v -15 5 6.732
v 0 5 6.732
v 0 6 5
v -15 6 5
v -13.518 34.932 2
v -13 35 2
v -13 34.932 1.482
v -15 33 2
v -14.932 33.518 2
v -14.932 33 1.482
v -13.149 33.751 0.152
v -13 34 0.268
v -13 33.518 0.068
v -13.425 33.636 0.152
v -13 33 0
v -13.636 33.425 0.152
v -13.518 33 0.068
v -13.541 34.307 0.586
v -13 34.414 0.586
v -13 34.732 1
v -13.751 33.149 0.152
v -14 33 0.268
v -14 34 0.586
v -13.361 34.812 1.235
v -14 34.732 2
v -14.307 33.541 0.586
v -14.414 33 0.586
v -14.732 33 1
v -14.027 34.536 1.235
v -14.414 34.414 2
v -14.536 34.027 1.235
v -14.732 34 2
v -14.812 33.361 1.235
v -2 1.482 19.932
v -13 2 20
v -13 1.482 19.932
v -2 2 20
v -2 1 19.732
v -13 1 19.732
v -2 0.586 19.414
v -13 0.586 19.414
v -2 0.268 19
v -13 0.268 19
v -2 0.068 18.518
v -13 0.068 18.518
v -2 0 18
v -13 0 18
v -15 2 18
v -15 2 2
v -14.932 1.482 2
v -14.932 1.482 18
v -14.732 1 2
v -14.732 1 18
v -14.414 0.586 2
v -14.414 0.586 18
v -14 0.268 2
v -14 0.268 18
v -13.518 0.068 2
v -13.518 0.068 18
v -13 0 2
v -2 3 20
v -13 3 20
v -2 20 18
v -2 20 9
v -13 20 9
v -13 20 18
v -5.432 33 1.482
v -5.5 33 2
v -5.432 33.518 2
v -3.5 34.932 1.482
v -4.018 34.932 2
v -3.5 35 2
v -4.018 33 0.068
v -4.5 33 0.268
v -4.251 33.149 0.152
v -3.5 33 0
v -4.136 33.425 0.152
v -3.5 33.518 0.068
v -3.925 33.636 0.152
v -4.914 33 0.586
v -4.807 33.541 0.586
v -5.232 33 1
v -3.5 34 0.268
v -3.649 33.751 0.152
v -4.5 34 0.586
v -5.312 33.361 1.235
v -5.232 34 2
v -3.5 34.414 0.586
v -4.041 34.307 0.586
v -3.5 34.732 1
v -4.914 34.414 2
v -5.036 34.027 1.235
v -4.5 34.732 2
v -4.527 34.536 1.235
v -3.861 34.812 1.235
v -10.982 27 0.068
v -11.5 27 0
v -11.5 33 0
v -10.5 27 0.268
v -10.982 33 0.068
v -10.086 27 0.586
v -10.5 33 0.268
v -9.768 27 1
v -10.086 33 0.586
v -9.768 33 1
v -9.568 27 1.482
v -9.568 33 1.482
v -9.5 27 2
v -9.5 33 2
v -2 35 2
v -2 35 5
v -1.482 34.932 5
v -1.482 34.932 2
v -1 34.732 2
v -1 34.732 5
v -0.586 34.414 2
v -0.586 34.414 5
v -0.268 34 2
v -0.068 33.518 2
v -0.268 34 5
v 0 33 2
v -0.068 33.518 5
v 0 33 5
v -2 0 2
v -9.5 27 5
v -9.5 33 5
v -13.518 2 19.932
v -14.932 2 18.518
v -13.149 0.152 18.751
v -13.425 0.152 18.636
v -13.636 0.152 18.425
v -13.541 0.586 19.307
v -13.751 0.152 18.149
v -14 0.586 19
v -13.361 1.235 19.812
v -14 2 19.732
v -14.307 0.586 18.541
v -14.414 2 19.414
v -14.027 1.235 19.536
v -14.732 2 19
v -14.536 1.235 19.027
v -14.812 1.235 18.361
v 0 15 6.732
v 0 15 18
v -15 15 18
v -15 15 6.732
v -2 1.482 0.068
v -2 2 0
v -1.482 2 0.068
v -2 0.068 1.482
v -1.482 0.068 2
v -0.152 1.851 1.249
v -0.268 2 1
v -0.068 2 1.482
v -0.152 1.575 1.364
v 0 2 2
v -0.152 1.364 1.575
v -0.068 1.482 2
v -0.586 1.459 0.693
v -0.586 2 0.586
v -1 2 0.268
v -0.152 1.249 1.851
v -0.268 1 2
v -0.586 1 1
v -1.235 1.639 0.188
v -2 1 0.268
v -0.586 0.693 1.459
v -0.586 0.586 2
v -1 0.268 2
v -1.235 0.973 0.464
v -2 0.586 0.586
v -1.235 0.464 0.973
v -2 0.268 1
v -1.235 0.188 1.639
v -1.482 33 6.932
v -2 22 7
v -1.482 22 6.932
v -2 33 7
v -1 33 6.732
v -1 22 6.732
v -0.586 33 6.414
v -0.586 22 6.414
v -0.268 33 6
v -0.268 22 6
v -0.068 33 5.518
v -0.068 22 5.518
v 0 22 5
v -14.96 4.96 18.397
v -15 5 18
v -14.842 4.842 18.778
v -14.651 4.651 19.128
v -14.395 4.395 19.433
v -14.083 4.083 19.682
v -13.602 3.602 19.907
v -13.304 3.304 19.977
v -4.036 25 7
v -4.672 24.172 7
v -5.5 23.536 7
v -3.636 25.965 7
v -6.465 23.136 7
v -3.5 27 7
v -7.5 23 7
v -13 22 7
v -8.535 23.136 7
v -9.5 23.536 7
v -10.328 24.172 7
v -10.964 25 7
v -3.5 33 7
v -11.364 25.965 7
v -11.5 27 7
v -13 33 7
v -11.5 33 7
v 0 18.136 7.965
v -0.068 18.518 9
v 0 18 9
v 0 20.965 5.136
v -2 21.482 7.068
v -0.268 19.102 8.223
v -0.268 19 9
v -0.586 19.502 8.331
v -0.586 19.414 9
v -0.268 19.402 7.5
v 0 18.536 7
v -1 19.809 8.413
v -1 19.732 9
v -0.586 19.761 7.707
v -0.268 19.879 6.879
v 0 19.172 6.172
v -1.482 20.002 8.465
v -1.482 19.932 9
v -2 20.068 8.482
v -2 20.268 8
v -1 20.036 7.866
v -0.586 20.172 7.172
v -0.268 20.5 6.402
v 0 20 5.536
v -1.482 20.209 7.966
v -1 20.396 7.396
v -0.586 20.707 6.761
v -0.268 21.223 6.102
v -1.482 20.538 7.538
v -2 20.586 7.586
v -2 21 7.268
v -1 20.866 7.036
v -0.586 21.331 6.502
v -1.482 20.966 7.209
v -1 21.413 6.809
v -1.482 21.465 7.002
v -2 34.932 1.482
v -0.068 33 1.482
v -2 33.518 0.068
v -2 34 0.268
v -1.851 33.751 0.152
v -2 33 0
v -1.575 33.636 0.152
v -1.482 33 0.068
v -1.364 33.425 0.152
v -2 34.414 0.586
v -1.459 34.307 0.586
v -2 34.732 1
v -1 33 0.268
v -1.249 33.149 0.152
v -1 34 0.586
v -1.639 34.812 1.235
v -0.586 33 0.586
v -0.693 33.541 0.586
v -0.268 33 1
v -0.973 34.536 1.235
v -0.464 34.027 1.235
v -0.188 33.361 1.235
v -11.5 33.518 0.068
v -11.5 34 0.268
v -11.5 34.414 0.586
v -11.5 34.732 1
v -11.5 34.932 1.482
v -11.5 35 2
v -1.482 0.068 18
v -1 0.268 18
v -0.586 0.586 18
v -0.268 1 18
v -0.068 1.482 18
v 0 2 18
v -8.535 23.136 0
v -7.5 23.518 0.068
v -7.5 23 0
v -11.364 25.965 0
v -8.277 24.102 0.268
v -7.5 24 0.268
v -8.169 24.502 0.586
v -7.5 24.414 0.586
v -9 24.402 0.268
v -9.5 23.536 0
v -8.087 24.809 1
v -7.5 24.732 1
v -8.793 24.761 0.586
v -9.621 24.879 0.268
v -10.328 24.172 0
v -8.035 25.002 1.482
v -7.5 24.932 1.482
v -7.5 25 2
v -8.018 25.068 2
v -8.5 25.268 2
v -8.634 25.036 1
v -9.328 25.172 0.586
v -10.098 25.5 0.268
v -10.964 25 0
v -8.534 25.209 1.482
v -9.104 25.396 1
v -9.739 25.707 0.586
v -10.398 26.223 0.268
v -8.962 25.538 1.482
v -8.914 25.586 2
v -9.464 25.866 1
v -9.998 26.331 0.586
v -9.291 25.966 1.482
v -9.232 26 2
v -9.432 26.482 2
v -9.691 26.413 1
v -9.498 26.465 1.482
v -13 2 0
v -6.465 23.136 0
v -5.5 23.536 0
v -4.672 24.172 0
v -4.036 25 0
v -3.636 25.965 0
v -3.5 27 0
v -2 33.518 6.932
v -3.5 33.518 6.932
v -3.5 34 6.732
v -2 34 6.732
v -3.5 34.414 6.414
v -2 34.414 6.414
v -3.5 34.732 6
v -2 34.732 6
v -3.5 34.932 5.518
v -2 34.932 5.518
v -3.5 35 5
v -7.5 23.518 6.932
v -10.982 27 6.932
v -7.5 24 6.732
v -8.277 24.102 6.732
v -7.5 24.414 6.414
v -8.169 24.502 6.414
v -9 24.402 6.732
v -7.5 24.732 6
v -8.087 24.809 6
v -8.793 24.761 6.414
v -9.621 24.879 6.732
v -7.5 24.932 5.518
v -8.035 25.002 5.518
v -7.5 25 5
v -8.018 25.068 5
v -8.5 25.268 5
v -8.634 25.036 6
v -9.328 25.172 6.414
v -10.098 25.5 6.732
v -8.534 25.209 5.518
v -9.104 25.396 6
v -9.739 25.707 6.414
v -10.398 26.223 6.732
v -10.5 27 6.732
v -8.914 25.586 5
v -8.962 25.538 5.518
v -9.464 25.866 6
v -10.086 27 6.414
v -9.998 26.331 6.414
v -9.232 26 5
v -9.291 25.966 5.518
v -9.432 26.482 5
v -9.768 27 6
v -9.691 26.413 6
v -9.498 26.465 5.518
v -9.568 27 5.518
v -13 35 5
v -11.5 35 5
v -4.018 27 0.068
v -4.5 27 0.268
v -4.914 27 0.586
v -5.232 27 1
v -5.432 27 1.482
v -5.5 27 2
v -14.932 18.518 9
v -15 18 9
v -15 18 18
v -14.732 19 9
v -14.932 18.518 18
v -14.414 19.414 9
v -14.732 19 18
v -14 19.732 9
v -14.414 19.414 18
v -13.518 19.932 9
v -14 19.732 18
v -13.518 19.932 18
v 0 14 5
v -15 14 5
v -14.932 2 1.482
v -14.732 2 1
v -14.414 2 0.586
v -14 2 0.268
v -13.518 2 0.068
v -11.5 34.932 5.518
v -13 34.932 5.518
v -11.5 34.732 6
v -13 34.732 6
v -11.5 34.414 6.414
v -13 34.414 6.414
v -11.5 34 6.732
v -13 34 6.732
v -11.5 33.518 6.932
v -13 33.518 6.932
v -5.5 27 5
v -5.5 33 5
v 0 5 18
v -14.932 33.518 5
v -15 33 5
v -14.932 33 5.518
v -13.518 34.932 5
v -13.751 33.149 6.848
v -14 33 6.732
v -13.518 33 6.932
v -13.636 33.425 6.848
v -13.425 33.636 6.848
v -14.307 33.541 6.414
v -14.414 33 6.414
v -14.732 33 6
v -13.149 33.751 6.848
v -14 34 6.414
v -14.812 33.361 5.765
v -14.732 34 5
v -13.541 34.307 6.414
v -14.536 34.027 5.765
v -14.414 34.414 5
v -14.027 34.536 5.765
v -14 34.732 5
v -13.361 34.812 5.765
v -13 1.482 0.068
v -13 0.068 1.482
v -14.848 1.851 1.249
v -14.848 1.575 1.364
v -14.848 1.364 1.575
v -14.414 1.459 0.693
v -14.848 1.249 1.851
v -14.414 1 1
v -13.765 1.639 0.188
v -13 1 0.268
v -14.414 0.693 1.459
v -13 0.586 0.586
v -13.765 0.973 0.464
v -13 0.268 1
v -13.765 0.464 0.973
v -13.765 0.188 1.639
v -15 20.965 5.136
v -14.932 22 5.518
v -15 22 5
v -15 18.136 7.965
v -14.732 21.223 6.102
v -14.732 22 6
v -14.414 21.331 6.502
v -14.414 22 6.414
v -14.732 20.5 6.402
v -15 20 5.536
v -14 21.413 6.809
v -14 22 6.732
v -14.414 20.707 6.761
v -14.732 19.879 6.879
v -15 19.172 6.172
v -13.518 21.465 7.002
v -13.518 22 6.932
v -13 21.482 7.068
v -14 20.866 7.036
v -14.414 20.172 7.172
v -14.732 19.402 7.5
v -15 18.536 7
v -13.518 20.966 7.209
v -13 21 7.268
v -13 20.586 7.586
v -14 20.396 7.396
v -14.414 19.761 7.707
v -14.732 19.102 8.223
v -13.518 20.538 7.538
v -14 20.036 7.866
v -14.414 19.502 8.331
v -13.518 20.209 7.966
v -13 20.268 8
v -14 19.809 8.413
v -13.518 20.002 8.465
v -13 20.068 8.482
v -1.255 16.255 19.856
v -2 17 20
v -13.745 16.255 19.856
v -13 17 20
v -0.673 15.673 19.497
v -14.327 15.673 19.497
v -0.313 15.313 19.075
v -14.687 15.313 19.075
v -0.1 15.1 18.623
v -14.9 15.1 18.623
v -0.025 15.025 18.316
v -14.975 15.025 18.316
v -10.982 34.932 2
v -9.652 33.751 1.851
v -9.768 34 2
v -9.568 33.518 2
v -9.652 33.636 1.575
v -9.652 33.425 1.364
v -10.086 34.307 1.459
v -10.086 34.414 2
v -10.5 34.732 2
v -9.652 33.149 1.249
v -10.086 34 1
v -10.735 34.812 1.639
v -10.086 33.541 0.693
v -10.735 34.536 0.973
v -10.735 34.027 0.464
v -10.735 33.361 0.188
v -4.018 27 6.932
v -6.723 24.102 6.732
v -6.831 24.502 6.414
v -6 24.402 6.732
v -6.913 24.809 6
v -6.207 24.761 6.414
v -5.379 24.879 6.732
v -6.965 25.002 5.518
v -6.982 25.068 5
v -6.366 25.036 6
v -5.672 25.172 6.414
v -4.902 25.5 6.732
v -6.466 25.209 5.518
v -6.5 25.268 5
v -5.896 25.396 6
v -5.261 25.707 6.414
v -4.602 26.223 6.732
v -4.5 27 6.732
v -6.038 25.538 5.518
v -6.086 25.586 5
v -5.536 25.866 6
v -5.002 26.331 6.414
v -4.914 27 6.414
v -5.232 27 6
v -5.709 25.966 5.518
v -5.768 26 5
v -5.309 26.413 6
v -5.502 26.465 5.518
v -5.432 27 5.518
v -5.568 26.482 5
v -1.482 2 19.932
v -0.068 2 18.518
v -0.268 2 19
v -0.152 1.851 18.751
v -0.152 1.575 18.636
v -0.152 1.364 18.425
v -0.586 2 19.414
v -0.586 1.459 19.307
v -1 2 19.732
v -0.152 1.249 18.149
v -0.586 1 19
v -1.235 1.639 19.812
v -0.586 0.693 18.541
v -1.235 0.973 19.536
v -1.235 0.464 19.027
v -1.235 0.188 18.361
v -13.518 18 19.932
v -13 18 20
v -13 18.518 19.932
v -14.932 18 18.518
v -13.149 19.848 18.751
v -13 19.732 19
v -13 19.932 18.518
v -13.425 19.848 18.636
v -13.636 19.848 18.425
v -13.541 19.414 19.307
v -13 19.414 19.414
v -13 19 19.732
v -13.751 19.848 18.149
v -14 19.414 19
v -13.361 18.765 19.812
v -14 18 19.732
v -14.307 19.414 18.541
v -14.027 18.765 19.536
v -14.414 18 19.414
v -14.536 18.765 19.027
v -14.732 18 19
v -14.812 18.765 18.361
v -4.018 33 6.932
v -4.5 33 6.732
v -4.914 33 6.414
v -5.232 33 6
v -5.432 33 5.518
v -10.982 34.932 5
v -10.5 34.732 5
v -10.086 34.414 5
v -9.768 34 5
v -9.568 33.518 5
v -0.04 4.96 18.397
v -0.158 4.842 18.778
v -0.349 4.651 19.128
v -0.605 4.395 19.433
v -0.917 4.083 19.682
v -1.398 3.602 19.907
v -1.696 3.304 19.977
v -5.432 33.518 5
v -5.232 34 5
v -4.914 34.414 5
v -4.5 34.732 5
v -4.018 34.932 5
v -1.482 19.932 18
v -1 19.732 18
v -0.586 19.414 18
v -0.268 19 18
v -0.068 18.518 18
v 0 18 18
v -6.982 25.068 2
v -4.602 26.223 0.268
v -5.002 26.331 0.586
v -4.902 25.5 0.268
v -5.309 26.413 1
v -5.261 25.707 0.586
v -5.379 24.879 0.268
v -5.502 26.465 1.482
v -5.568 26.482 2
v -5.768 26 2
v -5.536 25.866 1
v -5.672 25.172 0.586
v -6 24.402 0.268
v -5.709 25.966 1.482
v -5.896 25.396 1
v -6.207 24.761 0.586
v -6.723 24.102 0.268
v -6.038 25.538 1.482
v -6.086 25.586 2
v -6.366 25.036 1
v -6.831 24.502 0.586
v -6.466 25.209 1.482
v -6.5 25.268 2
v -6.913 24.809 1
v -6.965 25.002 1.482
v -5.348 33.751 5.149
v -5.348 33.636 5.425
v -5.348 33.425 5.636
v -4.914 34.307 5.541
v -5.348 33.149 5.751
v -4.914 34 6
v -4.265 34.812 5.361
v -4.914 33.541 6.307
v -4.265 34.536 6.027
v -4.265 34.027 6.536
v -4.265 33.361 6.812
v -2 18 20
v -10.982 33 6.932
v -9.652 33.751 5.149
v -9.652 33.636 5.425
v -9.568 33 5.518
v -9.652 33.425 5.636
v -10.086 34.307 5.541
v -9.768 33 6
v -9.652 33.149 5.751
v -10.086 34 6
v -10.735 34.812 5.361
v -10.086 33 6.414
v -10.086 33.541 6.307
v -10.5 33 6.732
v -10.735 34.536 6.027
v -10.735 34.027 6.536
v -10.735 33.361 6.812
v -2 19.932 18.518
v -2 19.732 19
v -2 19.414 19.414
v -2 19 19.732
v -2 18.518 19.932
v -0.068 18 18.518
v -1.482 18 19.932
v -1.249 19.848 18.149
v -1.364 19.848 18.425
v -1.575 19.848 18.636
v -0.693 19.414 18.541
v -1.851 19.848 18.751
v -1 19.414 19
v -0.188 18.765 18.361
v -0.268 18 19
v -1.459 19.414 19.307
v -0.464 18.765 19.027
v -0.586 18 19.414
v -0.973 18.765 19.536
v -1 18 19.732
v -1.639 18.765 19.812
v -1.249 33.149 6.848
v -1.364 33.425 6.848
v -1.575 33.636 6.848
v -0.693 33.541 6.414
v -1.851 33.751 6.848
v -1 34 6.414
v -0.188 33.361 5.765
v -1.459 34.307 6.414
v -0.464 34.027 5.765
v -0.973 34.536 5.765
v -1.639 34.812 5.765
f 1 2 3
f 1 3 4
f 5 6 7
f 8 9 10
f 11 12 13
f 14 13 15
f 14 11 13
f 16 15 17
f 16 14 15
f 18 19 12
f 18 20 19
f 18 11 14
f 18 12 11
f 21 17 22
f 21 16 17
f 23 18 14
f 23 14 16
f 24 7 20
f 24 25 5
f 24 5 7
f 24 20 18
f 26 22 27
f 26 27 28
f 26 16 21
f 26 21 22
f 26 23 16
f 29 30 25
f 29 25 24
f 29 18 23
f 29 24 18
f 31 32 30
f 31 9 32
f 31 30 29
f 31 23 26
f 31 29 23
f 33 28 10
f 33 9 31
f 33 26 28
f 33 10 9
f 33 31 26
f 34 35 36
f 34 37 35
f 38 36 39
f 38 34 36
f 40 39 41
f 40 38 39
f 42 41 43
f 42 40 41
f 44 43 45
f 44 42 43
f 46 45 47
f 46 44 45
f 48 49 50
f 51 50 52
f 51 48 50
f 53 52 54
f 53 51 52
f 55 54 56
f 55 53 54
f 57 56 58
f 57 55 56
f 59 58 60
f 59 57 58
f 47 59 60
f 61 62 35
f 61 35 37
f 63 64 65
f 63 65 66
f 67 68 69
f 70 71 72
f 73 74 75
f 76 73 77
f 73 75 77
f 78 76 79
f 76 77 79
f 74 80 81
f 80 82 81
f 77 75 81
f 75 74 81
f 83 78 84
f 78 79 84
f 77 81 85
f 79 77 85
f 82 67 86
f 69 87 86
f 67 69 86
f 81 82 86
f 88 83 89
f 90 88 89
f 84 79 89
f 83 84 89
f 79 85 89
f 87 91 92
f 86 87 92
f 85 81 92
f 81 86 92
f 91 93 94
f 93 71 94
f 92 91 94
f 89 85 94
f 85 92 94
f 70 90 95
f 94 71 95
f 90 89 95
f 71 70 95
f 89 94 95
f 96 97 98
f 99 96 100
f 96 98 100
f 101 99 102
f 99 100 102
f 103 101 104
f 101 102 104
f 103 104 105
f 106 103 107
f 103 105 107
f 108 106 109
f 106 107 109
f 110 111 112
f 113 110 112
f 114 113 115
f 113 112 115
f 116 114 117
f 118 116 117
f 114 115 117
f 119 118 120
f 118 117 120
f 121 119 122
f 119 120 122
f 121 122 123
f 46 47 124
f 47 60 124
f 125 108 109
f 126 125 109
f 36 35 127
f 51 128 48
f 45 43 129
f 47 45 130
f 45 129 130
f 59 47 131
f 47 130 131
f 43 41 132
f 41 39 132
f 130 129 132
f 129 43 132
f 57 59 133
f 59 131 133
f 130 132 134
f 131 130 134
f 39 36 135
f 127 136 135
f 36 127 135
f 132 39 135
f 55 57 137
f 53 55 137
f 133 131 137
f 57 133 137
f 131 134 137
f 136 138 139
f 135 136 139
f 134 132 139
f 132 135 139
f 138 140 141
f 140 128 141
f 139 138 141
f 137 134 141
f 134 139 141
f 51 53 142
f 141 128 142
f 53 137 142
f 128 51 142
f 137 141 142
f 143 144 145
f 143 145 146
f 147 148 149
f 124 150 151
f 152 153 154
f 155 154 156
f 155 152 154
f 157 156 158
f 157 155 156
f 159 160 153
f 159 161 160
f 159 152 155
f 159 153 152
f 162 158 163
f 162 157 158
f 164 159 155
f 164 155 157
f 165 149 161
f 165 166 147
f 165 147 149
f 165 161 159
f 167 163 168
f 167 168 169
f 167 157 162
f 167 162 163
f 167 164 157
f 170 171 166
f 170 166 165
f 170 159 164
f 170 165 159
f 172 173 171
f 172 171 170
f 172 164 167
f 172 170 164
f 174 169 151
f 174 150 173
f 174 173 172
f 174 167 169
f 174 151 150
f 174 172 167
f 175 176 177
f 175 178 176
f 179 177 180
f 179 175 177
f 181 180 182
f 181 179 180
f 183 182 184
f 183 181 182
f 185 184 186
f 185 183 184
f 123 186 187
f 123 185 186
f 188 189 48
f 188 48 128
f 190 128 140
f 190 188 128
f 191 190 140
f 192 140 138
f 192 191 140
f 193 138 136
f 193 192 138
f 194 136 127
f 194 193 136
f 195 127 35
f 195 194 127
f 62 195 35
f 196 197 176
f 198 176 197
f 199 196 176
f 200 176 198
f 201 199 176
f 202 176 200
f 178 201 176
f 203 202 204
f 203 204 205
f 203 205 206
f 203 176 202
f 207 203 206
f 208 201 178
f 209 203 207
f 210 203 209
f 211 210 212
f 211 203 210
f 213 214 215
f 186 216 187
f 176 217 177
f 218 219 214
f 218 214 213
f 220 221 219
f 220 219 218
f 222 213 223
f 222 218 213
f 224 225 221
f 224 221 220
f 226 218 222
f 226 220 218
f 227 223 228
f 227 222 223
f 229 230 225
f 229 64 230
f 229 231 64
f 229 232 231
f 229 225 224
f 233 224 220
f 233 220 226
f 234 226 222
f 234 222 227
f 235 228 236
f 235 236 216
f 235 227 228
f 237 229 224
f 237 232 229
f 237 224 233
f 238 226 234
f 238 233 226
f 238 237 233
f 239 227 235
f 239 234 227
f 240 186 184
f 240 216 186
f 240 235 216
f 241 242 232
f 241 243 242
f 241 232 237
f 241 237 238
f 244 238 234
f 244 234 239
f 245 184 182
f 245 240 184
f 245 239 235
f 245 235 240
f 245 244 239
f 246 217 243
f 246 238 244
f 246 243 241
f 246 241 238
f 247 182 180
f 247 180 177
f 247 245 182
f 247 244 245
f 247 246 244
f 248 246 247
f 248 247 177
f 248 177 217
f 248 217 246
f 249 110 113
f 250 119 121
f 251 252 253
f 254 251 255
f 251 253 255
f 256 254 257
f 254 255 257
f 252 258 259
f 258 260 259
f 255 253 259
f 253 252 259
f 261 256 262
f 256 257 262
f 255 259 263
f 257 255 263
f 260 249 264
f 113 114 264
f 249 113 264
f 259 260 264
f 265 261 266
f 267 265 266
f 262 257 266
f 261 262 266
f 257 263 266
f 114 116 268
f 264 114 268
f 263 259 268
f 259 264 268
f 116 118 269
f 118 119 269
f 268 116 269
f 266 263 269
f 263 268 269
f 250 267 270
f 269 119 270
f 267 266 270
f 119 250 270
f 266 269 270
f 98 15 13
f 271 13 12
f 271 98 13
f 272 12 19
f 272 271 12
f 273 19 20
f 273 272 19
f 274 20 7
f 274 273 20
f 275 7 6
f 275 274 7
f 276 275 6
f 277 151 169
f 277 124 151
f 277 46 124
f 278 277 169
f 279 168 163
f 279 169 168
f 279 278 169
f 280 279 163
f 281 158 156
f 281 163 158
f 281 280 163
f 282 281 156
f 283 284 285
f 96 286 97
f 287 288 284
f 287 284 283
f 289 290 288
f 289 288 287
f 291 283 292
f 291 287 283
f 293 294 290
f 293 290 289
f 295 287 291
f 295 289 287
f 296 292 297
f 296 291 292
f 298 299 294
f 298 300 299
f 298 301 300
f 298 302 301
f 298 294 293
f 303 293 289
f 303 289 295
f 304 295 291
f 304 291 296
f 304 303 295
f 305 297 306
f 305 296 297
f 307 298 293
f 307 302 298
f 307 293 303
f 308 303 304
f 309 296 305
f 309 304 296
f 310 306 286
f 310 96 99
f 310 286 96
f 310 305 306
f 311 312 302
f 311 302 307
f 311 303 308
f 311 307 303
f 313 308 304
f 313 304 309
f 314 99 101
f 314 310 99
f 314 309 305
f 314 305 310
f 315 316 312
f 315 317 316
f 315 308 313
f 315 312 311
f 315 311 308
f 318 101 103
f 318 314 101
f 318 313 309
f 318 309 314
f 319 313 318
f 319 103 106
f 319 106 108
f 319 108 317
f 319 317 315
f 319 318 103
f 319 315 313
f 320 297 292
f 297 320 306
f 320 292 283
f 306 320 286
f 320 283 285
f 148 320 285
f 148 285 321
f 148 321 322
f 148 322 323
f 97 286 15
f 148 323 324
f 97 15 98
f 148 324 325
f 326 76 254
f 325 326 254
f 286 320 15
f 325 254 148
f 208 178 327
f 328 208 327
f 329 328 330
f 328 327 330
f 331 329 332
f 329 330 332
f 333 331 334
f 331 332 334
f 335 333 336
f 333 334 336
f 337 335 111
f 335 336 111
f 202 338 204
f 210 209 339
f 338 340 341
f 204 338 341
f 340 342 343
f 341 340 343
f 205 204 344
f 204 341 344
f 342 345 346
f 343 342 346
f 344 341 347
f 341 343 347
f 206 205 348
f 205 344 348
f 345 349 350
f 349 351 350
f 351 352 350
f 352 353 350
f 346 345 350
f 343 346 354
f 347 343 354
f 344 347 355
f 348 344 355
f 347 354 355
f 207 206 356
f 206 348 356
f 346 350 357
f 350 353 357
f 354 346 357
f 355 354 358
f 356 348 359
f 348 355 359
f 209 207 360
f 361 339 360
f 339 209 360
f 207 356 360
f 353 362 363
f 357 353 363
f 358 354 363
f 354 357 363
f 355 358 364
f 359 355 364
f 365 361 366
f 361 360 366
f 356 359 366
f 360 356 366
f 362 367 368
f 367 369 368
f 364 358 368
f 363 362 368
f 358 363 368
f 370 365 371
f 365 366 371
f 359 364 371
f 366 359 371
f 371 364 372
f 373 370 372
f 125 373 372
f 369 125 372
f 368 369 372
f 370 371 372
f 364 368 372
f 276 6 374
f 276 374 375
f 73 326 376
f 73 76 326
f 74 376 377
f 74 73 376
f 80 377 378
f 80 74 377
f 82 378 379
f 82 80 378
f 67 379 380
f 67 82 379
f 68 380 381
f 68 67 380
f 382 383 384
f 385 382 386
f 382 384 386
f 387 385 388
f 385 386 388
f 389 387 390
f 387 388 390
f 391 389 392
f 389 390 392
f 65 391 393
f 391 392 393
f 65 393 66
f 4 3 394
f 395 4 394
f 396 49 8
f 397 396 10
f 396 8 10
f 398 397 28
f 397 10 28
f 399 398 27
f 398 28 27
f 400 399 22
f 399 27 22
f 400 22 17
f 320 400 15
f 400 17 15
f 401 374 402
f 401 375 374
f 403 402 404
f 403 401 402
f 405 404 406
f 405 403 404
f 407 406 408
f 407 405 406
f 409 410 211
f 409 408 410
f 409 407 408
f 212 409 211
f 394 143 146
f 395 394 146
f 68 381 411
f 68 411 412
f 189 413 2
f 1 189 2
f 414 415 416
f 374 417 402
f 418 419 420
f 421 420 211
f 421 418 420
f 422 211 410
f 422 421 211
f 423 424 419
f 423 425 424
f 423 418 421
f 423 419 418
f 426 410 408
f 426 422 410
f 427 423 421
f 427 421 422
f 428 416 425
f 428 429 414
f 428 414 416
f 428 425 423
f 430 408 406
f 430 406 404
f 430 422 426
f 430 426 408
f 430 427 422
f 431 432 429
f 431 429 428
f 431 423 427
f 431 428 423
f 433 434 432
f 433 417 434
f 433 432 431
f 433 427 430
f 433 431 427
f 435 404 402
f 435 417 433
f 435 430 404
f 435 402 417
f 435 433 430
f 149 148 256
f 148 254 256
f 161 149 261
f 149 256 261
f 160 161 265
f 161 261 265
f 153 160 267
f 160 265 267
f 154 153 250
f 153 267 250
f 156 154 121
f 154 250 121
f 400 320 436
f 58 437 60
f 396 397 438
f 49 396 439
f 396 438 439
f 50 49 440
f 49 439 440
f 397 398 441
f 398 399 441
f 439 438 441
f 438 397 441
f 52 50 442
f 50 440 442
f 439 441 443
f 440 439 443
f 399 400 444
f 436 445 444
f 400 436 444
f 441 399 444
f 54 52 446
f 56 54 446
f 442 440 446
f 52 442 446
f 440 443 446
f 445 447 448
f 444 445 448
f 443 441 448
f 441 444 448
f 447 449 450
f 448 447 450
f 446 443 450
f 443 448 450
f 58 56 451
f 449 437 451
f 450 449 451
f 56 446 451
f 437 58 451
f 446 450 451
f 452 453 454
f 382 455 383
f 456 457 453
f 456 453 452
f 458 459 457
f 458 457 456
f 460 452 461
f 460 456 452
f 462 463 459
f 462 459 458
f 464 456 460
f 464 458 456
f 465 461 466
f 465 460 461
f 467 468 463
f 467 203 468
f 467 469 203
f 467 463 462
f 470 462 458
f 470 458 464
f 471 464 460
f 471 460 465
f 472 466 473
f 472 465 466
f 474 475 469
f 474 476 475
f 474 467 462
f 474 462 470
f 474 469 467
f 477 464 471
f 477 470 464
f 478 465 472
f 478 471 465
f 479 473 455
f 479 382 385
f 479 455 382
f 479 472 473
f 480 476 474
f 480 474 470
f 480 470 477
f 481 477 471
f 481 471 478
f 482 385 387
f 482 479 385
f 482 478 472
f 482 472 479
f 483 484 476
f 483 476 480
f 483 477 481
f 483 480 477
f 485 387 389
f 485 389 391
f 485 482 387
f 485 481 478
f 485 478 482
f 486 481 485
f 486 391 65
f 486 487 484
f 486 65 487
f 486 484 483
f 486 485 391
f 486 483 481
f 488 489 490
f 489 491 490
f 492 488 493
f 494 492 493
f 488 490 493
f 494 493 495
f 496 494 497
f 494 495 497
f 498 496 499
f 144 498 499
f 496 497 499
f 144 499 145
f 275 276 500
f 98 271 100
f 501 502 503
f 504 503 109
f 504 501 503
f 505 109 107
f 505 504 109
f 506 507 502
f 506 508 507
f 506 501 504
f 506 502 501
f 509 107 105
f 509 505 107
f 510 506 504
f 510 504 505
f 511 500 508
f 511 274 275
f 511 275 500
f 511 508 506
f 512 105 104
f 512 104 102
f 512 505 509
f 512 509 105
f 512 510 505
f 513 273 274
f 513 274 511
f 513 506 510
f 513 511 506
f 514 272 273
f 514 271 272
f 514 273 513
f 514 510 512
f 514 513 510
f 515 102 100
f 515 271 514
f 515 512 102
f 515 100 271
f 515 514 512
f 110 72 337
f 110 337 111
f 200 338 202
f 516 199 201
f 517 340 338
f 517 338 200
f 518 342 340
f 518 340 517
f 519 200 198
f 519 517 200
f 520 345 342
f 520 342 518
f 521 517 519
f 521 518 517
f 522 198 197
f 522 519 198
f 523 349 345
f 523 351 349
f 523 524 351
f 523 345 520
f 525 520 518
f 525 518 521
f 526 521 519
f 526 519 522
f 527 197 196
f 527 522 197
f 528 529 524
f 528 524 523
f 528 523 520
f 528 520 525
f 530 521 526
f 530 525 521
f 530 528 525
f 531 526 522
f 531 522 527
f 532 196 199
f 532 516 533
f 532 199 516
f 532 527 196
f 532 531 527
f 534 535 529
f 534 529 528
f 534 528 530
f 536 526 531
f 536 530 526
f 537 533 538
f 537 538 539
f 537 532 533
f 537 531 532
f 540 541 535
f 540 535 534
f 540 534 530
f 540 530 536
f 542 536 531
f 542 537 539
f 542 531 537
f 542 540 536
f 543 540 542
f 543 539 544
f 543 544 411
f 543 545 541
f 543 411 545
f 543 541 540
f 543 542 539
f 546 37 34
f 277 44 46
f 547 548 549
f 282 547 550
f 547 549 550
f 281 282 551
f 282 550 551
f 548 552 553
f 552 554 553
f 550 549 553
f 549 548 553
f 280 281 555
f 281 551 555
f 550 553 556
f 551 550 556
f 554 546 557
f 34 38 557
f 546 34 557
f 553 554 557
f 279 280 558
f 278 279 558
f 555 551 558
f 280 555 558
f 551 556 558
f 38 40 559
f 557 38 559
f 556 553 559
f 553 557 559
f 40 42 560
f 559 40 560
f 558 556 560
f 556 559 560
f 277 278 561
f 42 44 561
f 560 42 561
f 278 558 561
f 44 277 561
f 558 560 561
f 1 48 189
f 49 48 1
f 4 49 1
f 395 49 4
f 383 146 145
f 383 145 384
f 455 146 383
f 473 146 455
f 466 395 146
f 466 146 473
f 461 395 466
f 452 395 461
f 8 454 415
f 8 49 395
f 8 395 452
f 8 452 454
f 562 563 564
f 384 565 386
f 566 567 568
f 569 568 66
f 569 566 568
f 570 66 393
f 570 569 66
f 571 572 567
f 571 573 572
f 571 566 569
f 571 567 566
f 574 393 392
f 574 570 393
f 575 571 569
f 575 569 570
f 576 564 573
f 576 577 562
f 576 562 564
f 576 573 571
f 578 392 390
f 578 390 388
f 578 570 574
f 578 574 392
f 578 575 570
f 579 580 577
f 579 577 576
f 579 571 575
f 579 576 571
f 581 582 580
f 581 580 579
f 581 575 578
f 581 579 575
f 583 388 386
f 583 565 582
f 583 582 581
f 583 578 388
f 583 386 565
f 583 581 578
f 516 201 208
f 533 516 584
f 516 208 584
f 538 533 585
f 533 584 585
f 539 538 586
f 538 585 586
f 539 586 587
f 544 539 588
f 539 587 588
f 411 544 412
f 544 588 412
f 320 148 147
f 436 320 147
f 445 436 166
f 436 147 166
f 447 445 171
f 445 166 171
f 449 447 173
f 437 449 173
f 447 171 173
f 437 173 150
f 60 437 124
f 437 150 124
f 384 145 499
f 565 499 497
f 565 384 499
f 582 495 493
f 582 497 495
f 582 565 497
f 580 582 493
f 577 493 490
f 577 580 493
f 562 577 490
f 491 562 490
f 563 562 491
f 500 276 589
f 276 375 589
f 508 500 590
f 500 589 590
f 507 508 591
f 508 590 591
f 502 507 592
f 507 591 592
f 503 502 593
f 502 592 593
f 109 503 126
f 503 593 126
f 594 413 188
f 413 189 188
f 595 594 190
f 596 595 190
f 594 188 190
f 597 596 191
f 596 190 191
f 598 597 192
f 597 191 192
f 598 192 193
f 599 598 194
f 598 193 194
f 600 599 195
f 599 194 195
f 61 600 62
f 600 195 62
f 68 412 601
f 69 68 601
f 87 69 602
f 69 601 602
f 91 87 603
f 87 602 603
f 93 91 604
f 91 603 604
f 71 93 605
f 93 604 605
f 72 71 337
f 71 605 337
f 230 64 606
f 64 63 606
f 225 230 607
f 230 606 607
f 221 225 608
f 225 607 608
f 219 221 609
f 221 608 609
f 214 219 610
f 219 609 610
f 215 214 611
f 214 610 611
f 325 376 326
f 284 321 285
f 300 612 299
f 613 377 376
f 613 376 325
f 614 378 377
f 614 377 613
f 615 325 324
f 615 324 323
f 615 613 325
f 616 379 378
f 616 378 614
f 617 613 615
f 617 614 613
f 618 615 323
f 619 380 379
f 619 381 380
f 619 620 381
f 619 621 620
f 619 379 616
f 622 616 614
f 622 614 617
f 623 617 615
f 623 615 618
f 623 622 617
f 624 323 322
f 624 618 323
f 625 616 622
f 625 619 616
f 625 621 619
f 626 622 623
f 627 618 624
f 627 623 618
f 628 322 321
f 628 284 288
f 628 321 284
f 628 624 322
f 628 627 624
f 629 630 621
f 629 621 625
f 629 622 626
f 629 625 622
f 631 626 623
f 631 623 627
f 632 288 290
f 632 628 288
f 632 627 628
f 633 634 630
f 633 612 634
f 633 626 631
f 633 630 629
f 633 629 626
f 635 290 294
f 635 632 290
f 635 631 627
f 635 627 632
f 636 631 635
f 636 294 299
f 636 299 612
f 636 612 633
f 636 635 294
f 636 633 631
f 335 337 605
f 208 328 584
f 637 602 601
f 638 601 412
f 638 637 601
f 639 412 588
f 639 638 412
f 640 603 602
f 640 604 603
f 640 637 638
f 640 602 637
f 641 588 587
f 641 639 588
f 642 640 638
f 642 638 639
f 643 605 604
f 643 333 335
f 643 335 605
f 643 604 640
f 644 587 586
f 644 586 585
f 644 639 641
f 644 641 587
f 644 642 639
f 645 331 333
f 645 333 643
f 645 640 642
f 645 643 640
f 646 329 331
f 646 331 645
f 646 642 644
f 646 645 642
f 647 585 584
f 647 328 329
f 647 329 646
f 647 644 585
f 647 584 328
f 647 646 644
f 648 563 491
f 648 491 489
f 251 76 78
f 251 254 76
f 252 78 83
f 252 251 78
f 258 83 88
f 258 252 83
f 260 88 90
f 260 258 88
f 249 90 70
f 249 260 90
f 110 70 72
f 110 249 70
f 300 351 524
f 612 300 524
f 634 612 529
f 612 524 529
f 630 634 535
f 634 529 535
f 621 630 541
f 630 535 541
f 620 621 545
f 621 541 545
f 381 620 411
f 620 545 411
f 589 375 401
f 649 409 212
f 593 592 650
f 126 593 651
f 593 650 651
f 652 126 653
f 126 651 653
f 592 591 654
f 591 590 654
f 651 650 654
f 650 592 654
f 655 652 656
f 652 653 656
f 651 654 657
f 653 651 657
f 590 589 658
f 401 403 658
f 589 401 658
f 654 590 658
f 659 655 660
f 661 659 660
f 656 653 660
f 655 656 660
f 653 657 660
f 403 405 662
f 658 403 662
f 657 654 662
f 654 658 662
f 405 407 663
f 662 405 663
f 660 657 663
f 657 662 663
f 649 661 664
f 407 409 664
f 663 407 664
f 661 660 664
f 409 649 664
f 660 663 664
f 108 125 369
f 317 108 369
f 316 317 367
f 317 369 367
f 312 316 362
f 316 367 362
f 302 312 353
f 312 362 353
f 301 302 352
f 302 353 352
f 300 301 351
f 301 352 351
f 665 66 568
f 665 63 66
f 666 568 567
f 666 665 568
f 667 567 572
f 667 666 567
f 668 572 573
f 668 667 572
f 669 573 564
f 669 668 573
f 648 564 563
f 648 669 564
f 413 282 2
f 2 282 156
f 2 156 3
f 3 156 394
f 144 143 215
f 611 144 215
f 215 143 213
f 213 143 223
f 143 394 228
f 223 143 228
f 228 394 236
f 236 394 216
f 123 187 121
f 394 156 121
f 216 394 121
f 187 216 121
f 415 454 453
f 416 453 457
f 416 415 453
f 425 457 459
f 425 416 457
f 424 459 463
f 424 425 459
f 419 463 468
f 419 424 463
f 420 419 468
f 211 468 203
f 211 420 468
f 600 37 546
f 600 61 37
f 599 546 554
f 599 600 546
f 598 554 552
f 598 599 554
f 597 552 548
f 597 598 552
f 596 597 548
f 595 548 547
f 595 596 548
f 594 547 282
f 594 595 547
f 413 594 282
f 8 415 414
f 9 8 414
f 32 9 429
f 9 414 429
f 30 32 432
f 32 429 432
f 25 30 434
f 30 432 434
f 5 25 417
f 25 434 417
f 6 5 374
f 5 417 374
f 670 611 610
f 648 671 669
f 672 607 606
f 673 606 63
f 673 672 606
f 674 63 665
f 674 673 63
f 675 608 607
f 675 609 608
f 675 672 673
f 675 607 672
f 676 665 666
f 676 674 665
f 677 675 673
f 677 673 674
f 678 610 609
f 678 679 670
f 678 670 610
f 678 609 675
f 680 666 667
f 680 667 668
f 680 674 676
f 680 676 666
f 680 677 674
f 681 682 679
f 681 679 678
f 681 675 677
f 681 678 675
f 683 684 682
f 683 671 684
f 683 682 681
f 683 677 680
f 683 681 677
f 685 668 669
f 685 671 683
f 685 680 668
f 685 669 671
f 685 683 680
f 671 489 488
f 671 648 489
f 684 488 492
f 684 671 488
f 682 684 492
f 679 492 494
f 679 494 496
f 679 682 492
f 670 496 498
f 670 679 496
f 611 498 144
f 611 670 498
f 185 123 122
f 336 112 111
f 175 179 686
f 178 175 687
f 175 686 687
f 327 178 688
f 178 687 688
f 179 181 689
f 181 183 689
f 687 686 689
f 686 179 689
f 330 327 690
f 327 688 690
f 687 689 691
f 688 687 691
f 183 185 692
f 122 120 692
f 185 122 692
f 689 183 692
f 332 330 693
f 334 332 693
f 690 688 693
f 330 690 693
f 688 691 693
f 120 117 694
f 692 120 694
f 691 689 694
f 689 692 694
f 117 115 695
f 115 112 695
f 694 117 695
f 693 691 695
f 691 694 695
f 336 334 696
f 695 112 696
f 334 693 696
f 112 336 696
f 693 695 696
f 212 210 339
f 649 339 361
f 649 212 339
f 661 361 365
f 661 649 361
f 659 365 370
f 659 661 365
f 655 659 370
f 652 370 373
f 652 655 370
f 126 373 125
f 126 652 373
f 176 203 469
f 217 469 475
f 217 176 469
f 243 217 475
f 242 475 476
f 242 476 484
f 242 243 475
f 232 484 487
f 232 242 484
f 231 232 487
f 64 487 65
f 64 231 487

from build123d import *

# Parameters (mm, degrees)
SKETCH1_W                      = 15
SKETCH1_H                      = 35
BOSS_EXTRUDE1_DEPTH            = 20
SKETCH2_W                      = 15
SKETCH2_H                      = 10
CUT_EXTRUDE1_DEPTH             = 44.011626335
SKETCH4_W                      = 13
SKETCH4_H                      = 15
CUT_EXTRUDE3_DEPTH             = 44.011626335
CUT_EXTRUDE4_REACH             = 45.012
SKETCH5_W                      = 4
SKETCH5_H                      = 10
CUT_EXTRUDE4_DIRECTION_2_DEPTH = 44.011626335
FILLET2_R                      = 2
CHAMFER1_SIZE                  = 1
CHAMFER1_SIZE2                 = 1.732050808


with BuildPart() as part:
    # Sketch1 → Boss-Extrude1 (new body)
    with BuildSketch(Plane.XY):
        with Locations((-7.5, 17.5)):
            Rectangle(SKETCH1_W, SKETCH1_H)
    extrude(amount=BOSS_EXTRUDE1_DEPTH)

    # Sketch2 → Cut-Extrude1 (cut, through all)
    with BuildSketch(Plane(origin=(0, 0, 0), x_dir=(0, 0, -1), z_dir=(1, 0, 0))):
        with Locations((-12.5, 10)):
            Rectangle(SKETCH2_W, SKETCH2_H)
    extrude(amount=-CUT_EXTRUDE1_DEPTH, mode=Mode.SUBTRACT)

    # Sketch4 → Cut-Extrude3 (cut, through all)
    with BuildSketch(Plane.ZY.offset(15)):
        with Locations((13.5, 27.5)):
            Rectangle(SKETCH4_W, SKETCH4_H)
    extrude(amount=-CUT_EXTRUDE3_DEPTH, mode=Mode.SUBTRACT)

    # Sketch5 → Cut-Extrude4 (cut, up to next)
    with BuildSketch(Plane(origin=(0, 0, 0), x_dir=(-1, 0, 0), z_dir=(0, 0, -1)), mode=Mode.PRIVATE) as cut_extrude4_sk1:
        with Locations((7.5, 30)):
            Rectangle(SKETCH5_W, SKETCH5_H)
    cut_extrude4_tool1 = extrude(cut_extrude4_sk1.sketch, amount=-CUT_EXTRUDE4_REACH, mode=Mode.PRIVATE) & part.part
    add(cut_extrude4_tool1.solids().sort_by_distance((-7.5, 30, 0))[0], mode=Mode.SUBTRACT)

    # Sketch5 → Cut-Extrude4 direction 2 (cut)
    with BuildSketch(Plane(origin=(0, 0, 0), x_dir=(-1, 0, 0), z_dir=(0, 0, -1))):
        with Locations((7.5, 30)):
            Rectangle(SKETCH5_W, SKETCH5_H)
    extrude(amount=CUT_EXTRUDE4_DIRECTION_2_DEPTH, mode=Mode.SUBTRACT)

    # Fillet2
    fillet2_edges = [part.edges().sort_by_distance(p)[0] for p in [
        (0, 17.5, 20),
        (-15, 2.5, 20),
        (-7.5, 0, 20),
        (-7.5, 5, 20),
        (-7.5, 15, 20),
        (-15, 17.5, 20),
        (-15, 35, 3.5),
        (0, 35, 3.5),
        (0, 20, 13.5),
        (-7.5, 20, 20),
        (0, 27.5, 7),
        (-7.5, 20, 7),
        (-2.75, 35, 7),
        (-15, 27.5, 7),
        (-15, 20, 13.5),
        (-12.25, 35, 7),
        (-12.25, 35, 0),
        (-5.5, 35, 3.5),
        (-5.5, 25, 3.5),
        (-9.5, 25, 3.5),
        (-9.5, 35, 3.5),
        (-5.5, 30, 0),
        (-7.5, 25, 0),
        (-9.5, 30, 0),
        (0, 2.5, 20),
        (-7.5, 0, 0),
        (-7.5, 25, 7),
        (-5.5, 30, 7),
        (-9.5, 30, 7),
        (-15, 17.5, 0),
        (-2.75, 35, 0),
        (0, 17.5, 0),
        (0, 0, 10),
        (-15, 0, 10),
    ]]
    fillet(fillet2_edges, radius=FILLET2_R - 0.0001)  # a hair under: the kernel refuses the full size

    # Chamfer1
    chamfer1_edges = [part.edges().sort_by_distance(p)[0] for p in [
        (-7.5, 15, 5),
        (-7.5, 5, 5),
    ]]
    chamfer1_side = [part.faces().sort_by_distance(p)[0] for p in [
        (-7.5, 10, 5),
    ]]
    chamfer(chamfer1_edges, length=CHAMFER1_SIZE, length2=CHAMFER1_SIZE2, reference=chamfer1_side[0])


solid = part.part
